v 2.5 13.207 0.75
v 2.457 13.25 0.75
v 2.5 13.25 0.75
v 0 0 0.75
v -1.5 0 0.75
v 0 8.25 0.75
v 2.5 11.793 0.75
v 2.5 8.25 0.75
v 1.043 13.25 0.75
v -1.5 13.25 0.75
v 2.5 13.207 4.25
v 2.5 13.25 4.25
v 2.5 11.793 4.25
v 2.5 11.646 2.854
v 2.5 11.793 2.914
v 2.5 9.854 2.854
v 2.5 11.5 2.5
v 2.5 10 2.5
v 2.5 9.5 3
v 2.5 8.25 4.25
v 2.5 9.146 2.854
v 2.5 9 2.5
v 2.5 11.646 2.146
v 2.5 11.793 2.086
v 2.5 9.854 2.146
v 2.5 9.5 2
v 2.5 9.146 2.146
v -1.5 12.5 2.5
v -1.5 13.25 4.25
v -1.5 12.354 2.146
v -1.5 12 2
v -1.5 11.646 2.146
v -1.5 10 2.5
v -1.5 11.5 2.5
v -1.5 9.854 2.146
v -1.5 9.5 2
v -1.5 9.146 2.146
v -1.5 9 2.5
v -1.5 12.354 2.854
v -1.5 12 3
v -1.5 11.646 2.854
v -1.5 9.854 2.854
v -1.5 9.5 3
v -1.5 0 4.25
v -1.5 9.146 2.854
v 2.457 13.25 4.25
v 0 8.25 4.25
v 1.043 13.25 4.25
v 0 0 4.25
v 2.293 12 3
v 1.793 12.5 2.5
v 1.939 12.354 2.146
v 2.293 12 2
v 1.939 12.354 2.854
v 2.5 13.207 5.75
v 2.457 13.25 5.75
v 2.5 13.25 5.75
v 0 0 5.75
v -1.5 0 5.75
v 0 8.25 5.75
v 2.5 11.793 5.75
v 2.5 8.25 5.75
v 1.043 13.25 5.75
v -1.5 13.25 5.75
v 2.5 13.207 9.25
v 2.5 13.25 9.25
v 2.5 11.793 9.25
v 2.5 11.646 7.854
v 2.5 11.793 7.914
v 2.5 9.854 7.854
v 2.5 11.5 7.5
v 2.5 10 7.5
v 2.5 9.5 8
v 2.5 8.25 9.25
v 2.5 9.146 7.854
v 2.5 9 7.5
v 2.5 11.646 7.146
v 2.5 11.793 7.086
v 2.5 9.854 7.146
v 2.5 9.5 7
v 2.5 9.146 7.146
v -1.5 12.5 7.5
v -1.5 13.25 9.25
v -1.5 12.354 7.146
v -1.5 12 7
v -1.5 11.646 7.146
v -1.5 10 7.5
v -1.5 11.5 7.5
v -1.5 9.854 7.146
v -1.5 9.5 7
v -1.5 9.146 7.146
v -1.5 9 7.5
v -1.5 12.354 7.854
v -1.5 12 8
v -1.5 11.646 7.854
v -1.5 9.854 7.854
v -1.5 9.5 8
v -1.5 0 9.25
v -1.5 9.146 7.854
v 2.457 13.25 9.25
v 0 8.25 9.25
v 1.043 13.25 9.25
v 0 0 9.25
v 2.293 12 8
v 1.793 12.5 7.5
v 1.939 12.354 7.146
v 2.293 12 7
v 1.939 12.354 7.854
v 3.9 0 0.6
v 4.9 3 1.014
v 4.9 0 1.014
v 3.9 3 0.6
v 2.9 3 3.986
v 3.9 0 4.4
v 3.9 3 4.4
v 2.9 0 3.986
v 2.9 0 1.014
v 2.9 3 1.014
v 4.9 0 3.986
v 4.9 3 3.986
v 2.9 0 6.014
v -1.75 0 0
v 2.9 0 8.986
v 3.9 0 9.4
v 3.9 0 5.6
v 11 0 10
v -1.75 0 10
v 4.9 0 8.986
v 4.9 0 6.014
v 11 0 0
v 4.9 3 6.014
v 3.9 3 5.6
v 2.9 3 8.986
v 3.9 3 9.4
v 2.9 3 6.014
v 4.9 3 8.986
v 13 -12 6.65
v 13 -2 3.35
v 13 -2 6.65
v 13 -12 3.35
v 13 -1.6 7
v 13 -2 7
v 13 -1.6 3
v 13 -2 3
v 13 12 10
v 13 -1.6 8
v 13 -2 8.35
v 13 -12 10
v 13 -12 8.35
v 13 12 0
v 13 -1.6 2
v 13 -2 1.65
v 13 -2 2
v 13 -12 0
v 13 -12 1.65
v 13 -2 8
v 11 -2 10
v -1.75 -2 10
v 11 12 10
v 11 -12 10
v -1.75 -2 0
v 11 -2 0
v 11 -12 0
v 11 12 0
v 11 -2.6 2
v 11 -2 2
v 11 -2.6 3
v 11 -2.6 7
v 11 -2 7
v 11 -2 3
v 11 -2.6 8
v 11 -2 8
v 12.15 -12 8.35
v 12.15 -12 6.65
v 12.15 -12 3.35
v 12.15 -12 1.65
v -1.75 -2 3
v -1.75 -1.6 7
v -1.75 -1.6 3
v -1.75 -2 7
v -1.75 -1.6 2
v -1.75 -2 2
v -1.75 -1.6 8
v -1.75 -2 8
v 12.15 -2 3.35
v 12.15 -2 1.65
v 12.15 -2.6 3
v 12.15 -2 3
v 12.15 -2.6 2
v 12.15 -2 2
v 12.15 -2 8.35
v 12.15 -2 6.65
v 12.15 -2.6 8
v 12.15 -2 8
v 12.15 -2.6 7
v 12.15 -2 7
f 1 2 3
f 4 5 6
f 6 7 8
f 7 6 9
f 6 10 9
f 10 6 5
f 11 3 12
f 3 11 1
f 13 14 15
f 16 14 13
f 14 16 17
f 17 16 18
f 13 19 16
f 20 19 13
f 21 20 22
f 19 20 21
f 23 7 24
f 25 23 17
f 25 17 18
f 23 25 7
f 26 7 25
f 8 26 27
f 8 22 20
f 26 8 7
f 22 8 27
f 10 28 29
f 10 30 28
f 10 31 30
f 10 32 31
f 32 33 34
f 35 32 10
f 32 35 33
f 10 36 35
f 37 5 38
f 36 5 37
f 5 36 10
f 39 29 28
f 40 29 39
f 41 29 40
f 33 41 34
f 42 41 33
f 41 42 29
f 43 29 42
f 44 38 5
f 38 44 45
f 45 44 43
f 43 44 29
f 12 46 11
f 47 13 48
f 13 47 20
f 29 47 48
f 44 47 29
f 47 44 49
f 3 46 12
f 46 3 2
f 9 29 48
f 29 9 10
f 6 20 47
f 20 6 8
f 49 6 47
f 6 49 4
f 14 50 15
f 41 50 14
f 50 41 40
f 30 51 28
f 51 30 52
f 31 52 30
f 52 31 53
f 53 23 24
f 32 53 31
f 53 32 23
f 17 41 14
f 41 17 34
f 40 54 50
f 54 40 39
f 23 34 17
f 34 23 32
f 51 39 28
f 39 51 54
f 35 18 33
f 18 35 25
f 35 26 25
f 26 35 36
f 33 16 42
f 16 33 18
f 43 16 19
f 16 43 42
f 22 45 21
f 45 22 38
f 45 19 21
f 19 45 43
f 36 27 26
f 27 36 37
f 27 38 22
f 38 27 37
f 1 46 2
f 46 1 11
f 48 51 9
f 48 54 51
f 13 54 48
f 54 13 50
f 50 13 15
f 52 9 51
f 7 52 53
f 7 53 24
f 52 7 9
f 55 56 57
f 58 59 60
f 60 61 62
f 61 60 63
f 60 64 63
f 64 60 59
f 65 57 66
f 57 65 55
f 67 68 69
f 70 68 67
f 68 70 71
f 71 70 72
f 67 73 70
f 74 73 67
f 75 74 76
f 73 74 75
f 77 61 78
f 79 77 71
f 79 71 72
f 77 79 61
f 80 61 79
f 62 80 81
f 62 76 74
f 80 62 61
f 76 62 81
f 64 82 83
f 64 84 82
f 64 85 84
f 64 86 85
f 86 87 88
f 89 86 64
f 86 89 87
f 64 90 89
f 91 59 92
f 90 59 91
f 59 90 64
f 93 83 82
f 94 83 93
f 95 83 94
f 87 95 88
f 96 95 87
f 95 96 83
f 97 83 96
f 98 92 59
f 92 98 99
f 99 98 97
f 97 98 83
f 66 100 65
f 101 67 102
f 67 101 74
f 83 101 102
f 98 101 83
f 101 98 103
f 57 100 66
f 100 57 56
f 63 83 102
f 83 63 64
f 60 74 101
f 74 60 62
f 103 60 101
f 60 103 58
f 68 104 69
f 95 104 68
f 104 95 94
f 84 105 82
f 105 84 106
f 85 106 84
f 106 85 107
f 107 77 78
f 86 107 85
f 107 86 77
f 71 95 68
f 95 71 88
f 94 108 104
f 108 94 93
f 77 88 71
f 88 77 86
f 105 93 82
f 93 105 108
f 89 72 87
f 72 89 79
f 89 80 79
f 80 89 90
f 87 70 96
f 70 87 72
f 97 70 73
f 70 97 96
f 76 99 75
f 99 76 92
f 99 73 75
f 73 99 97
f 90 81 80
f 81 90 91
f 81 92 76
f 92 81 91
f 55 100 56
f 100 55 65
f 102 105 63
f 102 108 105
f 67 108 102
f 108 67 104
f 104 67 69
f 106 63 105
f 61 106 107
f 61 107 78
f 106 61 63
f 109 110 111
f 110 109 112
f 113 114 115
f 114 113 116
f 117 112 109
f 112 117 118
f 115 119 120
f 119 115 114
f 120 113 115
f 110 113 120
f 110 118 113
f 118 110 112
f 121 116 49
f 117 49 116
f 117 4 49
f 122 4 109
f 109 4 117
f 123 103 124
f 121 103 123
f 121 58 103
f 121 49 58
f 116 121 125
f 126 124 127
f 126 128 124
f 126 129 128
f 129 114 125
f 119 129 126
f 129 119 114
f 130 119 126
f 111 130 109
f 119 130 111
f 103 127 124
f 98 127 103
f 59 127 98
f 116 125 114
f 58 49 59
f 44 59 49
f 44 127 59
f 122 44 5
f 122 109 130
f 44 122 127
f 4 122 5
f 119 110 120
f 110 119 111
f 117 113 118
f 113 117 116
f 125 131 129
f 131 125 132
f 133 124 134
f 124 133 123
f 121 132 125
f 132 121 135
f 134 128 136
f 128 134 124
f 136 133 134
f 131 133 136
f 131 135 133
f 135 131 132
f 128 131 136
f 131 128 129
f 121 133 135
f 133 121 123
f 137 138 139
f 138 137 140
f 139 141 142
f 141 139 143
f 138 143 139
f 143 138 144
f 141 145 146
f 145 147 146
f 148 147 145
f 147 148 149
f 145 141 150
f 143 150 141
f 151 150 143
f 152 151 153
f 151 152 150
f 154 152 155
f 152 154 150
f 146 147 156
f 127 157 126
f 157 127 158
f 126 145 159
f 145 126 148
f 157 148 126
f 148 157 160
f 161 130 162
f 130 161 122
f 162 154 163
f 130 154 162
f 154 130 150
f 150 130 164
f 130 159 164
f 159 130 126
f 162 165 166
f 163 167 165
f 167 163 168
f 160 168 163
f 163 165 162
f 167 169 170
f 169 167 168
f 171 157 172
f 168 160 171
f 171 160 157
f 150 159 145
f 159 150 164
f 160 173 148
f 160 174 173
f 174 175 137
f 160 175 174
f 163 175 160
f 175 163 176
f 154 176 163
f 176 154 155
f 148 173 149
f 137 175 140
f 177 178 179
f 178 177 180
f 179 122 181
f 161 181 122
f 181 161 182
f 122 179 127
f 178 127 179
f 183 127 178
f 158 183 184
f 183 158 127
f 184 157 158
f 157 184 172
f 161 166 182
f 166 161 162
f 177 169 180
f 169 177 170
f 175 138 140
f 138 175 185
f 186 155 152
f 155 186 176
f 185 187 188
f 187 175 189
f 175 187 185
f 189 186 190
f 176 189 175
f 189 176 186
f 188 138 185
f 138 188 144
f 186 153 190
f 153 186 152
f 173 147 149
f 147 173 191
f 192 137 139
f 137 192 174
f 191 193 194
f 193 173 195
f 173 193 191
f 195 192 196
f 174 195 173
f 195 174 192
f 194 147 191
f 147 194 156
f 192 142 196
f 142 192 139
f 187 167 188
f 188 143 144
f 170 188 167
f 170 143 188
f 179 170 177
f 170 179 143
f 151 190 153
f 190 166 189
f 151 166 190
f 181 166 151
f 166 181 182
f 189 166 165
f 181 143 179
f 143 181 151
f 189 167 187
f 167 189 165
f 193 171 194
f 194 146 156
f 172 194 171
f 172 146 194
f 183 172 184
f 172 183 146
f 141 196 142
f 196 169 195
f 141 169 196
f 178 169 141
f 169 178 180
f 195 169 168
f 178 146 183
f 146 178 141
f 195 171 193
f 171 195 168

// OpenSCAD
$fn=8;




ts=2; // толщина стенки
tp=1;//диаметр жилы
tpr=1.7;//диаметр провода
trb=[2,tp,2.5];//внешний, внутренний высота
knt=[12,11, 7.5, 7.8];//высота до центра, толщина, высота стопора
lin=[3.5,knt.x+trb.x,1.5];//ширина, длина, толщина
shp=3.0;
do=3.8;
step=5;
kk=2;

all_2();
module all_2(){
    difference(){
        union(){
            for(a=[0:1:kk-1]){
                translate([0,0,a*step])pin2();
            }
            for(a=[0:1:kk-1]){
                translate([knt[3]/2,0,a*step+step/2])ship();
            }
            hh=step*kk;
            translate([knt.y+ts/2, 0, hh/2]) cube([ts,knt.x*2,hh],true);
            translate([knt.y/2, -ts/2, hh/2]) cube([knt.y+ts+lin.z,ts,hh],true);
        }
        for(a=[0:1:kk-1]){
            translate([0,0,a*step])pin3();
        }
        for(a=[0:1:kk-1]){
            translate([0,0,a*step])pin4();
        }
    }
}

module ship(){
    intersection(){
        rotate([-90,0,0])cylinder(shp,do/2,do/2);
        cube([ts,do*4,8],true);
    }
}


module pin4(){
    translate([knt.x/2,-ts-0.1,step/2])cube([knt.x*2,tp,tp],true);;
}

module pin3(){
    translate([knt.y+ts,-knt.x/2-ts,step/2])cube([tpr,knt.x,tpr],true);;
}


module pin2(){
    //translate([-lin.z,knt.x,step/2])rotate([0,90,0])pin();
    translate([-lin.z,knt.x,step/2])rotate([0,90,0])pin_lin();
}

module pin1(){
    translate([0,0,lin.z])rotate([0,180,0])pin();
}
//pin_lin();
module pin(){
    difference(){
        union(){
            cylinder(trb.z+lin.z,trb.x/2,trb.x/2);
            translate([0, trb.x/2-lin.y/2,lin.z/2]) cube(lin,true);
        }
        translate([0,0,-0.1])cylinder(trb.z*2,trb.y/2,trb.y/2);
        translate([0,-(trb.x/2+trb.y),-0.1])cylinder(trb.z*2,trb.y/2,trb.y/2);
        translate([0, 0,trb.z+lin.z+trb.x/4]) rotate([-45,0,0])cube([trb.x*2,trb.x*2,trb.x/2],true);
    }
}
module pin_lin1(){
    difference(){
        union(){
            //cylinder(trb.z+lin.z,trb.x/2,trb.x/2);
            translate([0, 0,(trb.z+lin.z)/2]) cube([lin.x,ts+0.5,trb.z+lin.z],true);
            translate([0, trb.x/2-lin.y/2,lin.z/2]) cube(lin,true);
        }
        translate([0,0,-0.1])cylinder(trb.z*2,trb.y/2,trb.y/2);
        translate([0,-(trb.x/2+trb.y),-0.1])cylinder(trb.z*2,trb.y/2,trb.y/2);
        translate([0, 0,trb.z+lin.z+trb.x/4]) rotate([-45,0,0])cube([trb.x*2,trb.x*3,trb.x/2],true);
    }
}
module pin_lin(){
    difference(){
        union(){
            //cylinder(trb.z+lin.z,trb.x/2,trb.x/2);
            translate([0, -trb.z/2,(trb.z+lin.z)/2]) cube([lin.x,trb.z*2,trb.z+lin.z],true);
            translate([0, trb.x/2-lin.y/2,lin.z/2]) cube(lin,true);
        }
        translate([0,0,-0.1])cylinder(trb.z*2,trb.y/2,trb.y/2);
        translate([0,-trb.z,-0.1])cylinder(trb.z*2,trb.y/2,trb.y/2);
        translate([0, 0,trb.z+lin.z+trb.x/4]) rotate([-45,0,0])cube([trb.x*2,trb.x*3,trb.x/2],true);
    }
}
module pin_s(){
    difference(){
        union(){
            cylinder(trb.z+lin.z-trb.x/2,trb.x/2,trb.x/2);
            translate([0, 0,trb.z+lin.z-trb.x/2])sphere(r=trb.x/2);
            translate([0, trb.x/2-lin.y/2,lin.z/2]) cube(lin,true);
        }
        translate([0,0,-0.1])cylinder(trb.z*2,trb.y/2,trb.y/2);
        translate([0,-(trb.x/2+trb.y),-0.1])cylinder(trb.z*2,trb.y/2,trb.y/2);
    }
}
